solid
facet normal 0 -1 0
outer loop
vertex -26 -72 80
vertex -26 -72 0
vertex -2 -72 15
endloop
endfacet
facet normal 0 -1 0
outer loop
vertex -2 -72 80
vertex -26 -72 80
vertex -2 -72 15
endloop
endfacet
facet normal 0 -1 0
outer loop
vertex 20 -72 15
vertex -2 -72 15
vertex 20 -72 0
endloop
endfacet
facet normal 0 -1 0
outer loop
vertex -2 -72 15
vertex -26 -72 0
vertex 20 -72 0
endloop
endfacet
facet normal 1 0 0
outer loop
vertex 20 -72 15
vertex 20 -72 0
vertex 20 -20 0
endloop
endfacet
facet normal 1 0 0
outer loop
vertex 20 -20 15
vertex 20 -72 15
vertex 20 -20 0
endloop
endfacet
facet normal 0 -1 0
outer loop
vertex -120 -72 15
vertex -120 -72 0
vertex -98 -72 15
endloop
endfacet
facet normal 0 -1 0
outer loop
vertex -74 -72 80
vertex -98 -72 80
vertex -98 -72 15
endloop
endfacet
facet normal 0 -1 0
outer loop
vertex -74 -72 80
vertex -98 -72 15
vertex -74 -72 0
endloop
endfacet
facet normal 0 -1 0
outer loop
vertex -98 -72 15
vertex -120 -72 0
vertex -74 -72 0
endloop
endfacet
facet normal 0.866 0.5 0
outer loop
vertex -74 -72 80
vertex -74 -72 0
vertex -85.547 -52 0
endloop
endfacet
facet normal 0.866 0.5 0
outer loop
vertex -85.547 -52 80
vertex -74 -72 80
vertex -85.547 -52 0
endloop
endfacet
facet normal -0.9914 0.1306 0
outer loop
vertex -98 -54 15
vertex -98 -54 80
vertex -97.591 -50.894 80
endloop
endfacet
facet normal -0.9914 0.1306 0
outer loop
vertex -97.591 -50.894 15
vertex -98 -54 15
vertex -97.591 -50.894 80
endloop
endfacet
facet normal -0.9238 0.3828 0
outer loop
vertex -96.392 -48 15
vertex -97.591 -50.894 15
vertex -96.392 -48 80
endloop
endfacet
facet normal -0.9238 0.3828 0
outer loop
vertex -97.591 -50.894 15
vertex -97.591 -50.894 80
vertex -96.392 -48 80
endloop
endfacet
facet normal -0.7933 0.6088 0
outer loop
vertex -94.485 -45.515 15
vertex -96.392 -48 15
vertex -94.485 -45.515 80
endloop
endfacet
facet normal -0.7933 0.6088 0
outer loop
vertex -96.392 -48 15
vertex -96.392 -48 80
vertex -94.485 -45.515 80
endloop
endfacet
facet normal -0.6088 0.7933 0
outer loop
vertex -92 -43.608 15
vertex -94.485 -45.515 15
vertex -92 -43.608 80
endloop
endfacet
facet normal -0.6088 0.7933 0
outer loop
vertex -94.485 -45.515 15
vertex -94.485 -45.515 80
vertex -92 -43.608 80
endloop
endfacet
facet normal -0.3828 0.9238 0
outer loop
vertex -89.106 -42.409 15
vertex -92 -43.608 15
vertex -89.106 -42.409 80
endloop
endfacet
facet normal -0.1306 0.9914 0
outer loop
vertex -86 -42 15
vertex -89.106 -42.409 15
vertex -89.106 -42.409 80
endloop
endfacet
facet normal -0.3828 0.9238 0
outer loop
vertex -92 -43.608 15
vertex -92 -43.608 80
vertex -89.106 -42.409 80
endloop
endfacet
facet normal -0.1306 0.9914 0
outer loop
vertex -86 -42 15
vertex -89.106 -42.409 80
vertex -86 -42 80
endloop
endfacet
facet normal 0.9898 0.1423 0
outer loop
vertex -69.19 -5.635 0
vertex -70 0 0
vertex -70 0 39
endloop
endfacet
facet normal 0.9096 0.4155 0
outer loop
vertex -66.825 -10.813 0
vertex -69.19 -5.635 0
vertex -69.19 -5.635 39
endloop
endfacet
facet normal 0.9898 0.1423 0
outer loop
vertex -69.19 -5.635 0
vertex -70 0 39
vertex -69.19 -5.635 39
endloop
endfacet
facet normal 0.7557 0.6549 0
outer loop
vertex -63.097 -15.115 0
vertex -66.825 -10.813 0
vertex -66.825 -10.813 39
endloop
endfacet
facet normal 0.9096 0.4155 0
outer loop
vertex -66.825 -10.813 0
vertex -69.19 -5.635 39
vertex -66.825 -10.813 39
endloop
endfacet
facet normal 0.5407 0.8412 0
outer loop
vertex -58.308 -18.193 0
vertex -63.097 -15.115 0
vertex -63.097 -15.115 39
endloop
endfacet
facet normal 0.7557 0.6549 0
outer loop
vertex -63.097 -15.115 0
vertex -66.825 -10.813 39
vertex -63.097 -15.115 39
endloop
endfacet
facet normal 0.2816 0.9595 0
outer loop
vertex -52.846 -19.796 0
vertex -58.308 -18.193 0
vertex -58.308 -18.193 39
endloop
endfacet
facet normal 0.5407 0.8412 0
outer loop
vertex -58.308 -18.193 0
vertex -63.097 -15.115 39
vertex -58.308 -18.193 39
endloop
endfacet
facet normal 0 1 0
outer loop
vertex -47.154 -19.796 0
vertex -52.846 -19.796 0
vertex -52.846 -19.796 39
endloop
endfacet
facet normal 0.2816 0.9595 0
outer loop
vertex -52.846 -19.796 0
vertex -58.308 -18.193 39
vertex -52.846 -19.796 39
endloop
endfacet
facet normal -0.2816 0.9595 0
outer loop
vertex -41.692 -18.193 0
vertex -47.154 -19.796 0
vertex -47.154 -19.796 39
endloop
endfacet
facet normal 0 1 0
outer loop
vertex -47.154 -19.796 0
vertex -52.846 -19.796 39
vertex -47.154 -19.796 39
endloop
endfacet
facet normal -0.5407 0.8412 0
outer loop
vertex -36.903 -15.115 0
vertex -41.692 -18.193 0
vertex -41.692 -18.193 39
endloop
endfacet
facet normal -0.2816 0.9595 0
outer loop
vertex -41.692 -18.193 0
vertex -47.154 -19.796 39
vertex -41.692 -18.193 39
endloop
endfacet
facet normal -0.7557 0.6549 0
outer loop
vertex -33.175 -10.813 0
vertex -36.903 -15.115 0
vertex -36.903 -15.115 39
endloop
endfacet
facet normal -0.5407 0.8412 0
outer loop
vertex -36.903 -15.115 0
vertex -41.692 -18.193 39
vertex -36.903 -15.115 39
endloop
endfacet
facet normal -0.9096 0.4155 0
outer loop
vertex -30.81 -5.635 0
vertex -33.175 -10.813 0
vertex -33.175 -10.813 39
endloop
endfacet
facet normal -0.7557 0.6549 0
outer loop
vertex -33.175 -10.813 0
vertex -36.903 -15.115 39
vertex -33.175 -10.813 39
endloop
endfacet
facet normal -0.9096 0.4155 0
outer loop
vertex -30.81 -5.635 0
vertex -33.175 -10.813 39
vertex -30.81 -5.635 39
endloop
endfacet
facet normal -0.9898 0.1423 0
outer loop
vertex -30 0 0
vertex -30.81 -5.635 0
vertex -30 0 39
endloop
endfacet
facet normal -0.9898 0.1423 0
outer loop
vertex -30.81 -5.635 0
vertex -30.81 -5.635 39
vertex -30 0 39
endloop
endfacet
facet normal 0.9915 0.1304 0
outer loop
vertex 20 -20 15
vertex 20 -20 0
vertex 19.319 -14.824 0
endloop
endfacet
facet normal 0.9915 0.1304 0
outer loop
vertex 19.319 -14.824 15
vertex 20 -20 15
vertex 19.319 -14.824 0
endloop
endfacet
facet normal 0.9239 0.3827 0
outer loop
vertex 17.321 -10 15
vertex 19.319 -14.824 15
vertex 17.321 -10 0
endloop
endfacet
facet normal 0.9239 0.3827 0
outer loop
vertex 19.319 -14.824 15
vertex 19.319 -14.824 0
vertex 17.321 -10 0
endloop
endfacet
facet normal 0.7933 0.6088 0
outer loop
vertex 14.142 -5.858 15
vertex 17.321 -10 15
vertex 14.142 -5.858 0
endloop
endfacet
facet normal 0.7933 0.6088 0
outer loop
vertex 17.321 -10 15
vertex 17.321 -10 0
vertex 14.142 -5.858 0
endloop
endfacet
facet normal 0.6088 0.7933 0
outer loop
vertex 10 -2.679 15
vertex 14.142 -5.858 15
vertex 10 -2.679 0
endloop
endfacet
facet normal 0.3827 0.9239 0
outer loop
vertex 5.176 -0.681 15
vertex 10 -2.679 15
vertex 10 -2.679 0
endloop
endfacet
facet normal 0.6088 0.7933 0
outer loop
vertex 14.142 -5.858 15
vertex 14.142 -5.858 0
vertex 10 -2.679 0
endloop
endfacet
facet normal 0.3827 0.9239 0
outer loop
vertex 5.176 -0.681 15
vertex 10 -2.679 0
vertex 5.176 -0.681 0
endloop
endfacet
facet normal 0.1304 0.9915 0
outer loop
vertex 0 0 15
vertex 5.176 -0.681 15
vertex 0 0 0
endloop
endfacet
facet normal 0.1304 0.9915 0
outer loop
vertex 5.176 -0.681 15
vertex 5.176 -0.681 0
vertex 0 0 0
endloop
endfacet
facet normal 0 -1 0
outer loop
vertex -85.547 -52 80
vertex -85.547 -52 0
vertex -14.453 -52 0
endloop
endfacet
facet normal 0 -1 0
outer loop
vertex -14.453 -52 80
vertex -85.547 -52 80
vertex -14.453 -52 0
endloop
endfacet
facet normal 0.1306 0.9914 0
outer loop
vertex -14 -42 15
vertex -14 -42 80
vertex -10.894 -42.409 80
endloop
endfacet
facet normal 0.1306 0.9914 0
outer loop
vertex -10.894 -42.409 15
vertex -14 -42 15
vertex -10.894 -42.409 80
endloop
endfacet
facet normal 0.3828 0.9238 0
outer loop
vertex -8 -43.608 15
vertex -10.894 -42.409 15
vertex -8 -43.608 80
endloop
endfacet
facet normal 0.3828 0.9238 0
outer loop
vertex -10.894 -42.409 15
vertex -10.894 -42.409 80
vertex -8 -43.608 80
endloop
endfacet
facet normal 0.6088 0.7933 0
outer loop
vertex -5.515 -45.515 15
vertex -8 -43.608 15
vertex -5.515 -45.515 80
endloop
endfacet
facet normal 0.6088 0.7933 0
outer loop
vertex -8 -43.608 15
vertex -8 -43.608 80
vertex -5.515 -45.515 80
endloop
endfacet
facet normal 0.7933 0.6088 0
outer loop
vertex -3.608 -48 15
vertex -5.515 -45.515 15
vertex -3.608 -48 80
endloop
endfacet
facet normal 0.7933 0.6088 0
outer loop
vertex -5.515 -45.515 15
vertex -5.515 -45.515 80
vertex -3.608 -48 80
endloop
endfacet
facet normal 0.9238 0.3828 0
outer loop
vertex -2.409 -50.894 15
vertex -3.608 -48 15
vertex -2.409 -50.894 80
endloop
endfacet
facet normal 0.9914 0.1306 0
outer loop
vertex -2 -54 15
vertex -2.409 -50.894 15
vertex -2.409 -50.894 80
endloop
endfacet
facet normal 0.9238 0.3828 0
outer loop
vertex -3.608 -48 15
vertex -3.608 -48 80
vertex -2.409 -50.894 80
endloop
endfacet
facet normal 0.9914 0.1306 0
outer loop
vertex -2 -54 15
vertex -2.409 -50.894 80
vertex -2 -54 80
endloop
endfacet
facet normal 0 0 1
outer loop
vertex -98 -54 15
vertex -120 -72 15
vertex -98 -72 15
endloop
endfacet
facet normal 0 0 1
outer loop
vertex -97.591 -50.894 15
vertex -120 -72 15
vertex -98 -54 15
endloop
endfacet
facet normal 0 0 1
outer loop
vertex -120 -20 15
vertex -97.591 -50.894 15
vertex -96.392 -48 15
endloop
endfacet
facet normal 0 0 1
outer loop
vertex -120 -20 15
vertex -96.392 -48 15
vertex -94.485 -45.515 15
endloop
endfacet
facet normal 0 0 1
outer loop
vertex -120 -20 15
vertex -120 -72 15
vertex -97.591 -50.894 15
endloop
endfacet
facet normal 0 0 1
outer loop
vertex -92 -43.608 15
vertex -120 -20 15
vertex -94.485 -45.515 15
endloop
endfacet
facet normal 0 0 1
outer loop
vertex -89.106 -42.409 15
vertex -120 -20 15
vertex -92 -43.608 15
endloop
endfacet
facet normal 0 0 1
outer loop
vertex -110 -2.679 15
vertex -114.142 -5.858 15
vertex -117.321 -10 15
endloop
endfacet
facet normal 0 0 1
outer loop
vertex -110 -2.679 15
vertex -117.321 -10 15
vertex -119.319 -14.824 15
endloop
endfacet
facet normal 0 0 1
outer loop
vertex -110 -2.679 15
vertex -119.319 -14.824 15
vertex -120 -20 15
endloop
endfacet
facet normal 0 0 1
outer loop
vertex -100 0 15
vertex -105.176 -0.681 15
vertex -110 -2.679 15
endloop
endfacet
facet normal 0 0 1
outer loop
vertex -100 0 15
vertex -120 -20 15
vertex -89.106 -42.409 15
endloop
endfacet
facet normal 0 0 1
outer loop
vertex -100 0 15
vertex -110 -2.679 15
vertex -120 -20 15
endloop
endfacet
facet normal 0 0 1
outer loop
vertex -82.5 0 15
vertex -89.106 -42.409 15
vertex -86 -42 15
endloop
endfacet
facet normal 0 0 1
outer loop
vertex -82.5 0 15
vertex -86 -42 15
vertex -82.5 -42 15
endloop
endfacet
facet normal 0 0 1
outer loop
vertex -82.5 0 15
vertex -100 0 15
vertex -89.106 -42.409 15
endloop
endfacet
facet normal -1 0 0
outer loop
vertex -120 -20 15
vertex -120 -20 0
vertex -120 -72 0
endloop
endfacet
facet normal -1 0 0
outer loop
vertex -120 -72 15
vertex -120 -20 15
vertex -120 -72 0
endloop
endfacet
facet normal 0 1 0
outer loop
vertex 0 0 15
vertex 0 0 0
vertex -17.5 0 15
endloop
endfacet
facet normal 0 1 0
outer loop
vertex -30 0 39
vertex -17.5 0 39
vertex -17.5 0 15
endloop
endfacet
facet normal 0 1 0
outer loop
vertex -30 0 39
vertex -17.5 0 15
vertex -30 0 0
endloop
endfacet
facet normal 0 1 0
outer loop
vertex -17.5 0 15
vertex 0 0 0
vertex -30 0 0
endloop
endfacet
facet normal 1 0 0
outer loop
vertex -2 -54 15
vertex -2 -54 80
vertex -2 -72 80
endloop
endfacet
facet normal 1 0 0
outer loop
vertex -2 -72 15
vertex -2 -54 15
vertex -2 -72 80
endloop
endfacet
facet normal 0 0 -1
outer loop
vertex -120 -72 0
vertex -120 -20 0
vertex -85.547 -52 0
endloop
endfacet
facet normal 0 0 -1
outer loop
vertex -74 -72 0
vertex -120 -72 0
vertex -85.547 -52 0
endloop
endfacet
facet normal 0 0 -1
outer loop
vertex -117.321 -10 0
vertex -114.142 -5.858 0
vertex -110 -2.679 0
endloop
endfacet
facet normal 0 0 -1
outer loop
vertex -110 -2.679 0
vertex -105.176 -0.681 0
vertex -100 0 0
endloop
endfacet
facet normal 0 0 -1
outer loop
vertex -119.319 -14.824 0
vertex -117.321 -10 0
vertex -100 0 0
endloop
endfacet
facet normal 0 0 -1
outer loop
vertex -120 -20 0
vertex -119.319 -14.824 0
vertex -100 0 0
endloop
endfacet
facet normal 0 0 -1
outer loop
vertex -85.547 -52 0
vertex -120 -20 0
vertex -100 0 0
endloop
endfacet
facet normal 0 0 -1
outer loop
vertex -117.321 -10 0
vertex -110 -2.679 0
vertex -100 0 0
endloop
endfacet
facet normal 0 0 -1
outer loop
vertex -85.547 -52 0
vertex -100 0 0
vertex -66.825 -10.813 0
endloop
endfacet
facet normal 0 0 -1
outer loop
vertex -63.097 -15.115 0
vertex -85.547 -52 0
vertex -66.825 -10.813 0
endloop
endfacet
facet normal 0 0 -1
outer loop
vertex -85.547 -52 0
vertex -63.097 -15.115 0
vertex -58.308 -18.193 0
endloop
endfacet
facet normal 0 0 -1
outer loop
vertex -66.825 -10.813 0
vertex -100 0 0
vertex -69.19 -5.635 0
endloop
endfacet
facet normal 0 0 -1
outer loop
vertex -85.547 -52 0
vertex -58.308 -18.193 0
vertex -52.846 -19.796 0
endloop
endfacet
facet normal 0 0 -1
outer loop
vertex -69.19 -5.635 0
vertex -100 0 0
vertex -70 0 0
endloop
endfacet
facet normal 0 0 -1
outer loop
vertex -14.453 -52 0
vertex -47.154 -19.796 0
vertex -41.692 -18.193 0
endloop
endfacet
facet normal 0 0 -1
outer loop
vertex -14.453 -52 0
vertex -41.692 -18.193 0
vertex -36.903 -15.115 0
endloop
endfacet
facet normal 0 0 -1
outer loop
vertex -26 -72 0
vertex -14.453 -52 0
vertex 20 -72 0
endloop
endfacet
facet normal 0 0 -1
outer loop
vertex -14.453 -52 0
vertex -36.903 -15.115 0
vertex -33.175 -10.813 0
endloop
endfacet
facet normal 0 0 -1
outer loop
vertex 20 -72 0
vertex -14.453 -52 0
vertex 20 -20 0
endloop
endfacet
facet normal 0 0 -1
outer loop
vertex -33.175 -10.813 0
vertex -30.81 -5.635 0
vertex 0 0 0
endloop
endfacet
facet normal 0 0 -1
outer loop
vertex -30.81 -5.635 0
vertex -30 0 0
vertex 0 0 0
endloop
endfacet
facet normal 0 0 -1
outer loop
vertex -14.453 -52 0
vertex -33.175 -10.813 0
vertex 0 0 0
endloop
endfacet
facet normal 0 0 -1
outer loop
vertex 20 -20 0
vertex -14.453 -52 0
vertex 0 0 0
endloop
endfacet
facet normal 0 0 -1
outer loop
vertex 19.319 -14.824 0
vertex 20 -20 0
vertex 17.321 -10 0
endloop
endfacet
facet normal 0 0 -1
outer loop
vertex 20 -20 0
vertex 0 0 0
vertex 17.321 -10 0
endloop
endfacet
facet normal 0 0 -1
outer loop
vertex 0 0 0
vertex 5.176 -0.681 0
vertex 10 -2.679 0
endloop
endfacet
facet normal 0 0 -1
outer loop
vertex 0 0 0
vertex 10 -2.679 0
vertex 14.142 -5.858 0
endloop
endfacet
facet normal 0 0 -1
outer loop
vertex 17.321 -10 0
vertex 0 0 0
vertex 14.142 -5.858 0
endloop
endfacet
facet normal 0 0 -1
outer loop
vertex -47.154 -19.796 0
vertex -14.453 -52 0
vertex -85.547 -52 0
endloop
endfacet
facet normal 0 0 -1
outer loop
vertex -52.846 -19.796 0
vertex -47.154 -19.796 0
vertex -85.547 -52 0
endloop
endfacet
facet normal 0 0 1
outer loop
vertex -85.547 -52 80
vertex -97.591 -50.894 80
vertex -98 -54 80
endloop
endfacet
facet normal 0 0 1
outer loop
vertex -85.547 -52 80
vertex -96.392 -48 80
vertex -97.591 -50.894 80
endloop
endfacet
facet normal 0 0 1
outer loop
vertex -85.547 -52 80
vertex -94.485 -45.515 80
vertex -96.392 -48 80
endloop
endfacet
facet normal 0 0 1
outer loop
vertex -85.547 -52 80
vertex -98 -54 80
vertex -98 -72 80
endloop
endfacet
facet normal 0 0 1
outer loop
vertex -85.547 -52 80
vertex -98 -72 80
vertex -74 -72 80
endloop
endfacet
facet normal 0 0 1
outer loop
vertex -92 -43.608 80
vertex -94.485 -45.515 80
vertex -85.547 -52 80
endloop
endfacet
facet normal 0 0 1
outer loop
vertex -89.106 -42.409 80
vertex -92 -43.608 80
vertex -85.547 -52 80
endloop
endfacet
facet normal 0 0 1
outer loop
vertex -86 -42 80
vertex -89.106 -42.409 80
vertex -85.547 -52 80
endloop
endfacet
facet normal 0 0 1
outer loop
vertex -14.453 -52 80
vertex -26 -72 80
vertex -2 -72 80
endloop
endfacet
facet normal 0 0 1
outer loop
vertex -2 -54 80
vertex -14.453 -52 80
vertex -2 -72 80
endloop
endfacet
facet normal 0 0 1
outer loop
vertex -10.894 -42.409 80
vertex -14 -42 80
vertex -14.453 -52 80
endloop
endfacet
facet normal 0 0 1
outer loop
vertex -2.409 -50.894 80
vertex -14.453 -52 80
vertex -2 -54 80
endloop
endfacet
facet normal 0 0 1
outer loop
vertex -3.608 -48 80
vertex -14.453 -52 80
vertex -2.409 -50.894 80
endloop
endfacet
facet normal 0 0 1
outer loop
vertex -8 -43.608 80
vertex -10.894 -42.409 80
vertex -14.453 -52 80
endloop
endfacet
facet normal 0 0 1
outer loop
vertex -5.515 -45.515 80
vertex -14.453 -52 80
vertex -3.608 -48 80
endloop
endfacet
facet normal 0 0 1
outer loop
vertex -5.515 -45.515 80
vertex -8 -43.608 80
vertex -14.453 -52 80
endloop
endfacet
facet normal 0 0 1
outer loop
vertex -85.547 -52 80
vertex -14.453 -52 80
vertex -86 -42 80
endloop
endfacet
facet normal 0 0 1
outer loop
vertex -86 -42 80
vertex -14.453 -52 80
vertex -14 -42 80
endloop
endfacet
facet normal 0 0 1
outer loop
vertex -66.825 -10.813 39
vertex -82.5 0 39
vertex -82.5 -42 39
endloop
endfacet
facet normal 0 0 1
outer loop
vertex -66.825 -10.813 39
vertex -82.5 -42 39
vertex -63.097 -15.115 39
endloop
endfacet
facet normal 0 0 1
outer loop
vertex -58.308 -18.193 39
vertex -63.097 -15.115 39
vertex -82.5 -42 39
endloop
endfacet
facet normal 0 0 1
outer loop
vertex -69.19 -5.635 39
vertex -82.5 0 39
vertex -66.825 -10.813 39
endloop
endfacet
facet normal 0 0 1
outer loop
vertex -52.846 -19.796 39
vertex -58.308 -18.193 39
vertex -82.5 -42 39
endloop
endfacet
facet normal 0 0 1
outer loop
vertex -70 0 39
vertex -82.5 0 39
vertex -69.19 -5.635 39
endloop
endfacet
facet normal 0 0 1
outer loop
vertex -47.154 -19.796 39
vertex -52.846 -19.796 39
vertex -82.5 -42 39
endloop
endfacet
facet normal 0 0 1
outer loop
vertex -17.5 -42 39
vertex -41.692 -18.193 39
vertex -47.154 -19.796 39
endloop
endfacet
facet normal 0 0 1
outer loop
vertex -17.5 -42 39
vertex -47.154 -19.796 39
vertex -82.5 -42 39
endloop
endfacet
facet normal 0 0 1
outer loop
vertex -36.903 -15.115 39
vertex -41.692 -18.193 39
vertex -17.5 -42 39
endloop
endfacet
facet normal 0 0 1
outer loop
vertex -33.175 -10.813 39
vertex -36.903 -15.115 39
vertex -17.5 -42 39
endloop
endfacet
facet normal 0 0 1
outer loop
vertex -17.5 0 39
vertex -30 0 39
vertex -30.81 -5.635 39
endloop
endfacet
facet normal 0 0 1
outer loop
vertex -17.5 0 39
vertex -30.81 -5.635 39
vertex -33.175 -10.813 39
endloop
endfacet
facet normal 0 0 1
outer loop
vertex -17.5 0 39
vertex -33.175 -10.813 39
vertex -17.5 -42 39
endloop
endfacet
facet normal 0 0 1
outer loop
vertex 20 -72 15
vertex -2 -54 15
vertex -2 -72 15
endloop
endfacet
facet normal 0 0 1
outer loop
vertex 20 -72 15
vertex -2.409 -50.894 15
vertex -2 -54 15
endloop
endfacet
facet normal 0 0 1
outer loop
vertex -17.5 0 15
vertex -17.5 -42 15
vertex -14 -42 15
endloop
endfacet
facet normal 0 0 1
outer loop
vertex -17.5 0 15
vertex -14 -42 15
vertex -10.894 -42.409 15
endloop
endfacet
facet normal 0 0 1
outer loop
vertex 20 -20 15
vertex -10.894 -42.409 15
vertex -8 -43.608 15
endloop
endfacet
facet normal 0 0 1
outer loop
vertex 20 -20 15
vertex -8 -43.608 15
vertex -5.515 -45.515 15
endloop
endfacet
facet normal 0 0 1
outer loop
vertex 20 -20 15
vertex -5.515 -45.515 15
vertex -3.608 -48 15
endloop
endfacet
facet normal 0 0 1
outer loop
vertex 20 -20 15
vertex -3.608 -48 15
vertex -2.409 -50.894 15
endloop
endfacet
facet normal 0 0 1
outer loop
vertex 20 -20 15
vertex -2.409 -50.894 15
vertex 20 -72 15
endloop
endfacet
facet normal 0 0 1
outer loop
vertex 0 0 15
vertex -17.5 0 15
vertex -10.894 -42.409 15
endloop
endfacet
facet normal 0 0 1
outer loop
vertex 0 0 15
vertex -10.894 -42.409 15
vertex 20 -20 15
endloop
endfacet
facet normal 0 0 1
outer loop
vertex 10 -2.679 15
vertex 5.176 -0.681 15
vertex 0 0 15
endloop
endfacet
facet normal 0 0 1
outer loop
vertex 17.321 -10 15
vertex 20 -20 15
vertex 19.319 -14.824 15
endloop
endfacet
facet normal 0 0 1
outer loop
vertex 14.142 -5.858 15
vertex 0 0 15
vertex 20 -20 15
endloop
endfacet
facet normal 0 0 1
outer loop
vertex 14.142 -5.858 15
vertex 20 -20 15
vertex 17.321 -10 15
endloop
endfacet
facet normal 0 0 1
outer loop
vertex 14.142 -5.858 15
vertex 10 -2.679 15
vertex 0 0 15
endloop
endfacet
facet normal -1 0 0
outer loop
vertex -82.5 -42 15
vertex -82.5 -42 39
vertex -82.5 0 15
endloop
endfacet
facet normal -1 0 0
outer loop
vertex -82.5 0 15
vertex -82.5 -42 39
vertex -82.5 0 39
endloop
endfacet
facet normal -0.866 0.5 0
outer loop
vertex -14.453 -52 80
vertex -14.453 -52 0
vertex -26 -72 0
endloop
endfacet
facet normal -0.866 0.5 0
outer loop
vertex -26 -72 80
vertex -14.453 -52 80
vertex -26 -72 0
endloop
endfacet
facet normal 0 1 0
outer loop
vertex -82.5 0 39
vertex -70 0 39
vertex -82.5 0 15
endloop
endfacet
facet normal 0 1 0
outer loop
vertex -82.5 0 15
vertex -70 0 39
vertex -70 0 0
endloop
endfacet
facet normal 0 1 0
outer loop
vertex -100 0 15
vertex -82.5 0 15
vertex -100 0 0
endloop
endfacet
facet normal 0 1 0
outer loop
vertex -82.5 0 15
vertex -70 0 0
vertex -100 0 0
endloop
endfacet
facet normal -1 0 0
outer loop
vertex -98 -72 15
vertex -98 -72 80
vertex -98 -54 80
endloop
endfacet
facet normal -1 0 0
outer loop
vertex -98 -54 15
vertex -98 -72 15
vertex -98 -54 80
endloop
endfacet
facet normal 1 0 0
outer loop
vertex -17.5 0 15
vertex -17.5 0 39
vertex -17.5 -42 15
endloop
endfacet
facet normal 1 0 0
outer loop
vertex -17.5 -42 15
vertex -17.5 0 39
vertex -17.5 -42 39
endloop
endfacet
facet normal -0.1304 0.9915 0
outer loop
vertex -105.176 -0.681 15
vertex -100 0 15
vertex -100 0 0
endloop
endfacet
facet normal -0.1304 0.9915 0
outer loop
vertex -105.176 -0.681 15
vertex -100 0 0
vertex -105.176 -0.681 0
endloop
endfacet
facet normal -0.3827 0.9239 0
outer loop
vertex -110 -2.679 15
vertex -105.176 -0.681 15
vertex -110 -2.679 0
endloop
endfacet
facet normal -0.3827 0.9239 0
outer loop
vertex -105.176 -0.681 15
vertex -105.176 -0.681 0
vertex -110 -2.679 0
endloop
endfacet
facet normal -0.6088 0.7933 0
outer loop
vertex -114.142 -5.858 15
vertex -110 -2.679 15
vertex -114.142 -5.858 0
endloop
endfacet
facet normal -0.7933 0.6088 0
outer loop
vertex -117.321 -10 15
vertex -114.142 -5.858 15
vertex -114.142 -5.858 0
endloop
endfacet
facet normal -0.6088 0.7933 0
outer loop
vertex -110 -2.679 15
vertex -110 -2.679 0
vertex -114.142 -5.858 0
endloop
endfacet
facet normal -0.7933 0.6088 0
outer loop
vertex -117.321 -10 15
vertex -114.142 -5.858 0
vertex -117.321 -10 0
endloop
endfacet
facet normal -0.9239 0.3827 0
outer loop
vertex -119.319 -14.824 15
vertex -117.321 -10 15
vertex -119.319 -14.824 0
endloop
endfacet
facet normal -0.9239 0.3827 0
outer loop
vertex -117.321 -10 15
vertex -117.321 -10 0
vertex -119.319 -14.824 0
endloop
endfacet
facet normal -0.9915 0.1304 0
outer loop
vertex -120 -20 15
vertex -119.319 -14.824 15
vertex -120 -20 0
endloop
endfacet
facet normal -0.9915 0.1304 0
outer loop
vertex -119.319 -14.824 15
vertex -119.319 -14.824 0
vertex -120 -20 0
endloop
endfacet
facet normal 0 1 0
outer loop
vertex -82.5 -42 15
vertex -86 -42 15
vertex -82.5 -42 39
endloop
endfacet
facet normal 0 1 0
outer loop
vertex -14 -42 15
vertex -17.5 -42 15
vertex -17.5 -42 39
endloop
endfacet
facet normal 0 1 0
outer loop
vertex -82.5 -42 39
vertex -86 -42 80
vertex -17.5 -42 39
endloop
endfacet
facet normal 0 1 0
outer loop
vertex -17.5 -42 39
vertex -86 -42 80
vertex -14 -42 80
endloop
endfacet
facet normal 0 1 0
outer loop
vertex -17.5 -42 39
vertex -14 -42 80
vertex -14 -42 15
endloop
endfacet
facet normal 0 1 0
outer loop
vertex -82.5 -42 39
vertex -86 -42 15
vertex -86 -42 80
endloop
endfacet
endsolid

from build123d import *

# Parameters (mm, degrees)
IZIM1_W                     = 65
IZIM1_H                     = 42
Y_KSEKLIK_EKSTR_ZYON1_DEPTH = 80
IZIM3_R                     = 20
KES_EKSTR_ZYON1_DEPTH       = 81
KES_EKSTR_ZYON2_DEPTH       = 41
KES_EKSTR_ZYON5_DEPTH       = 65
KES_EKSTR_ZYON6_DEPTH       = 156
KES_EKSTR_ZYON6_DEPTH_BACK  = 1


with BuildPart() as part:
    # Çizim1 → Yükseklik-Ekstrüzyon1 (new body)
    with BuildSketch(Plane.XY):
        with BuildLine():
            Line((-120, -72), (-100, -72))
            Line((-100, -72), (0, -72))
            Line((0, -72), (20, -72))
            Line((20, -72), (20, -20))
            ThreePointArc((20, -20), (14.142135624, -5.857864376), (0, 0))
            Line((0, 0), (-17.5, 0))
            Line((-17.5, 0), (-17.5, -42))
            Line((-17.5, -42), (-82.5, -42))
            Line((-82.5, -42), (-82.5, 0))
            Line((-82.5, 0), (-100, 0))
            ThreePointArc((-100, 0), (-114.142135624, -5.857864376), (-120, -20))
            Line((-120, -20), (-120, -72))
        make_face()
        with Locations((-50, -21)):
            Rectangle(IZIM1_W, IZIM1_H)
    extrude(amount=Y_KSEKLIK_EKSTR_ZYON1_DEPTH)

    # Çizim3 → Kes-Ekstrüzyon1 (cut, through all)
    with BuildSketch(Plane.XY.offset(80)):
        with Locations((-50, 0)):
            Circle(IZIM3_R)
    extrude(amount=-KES_EKSTR_ZYON1_DEPTH, mode=Mode.SUBTRACT)

    # Çizim4 → Kes-Ekstrüzyon2 (cut)
    with BuildSketch(Plane.XY.offset(80)):
        with BuildLine():
            ThreePointArc((-30, 0), (-50, -20), (-70, 0))
            Line((-70, 0), (-82.5, 0))
            Line((-82.5, 0), (-82.5, -42))
            Line((-82.5, -42), (-17.5, -42))
            Line((-17.5, -42), (-17.5, 0))
            Line((-17.5, 0), (-30, 0))
        make_face()
    extrude(amount=-KES_EKSTR_ZYON2_DEPTH, mode=Mode.SUBTRACT)

    # Çizim5 → Kes-Ekstrüzyon5 (cut)
    with BuildSketch(Plane.XY.offset(80)):
        with BuildLine():
            Line((-120, -20), (-120, -72))
            Line((-120, -72), (-98, -72))
            Line((-98, -72), (-98, -54))
            ThreePointArc((-98, -54), (-94.485281374, -45.514718626), (-86, -42))
            Line((-86, -42), (-82.5, -42))
            Line((-82.5, -42), (-82.5, 0))
            Line((-82.5, 0), (-100, 0))
            ThreePointArc((-100, 0), (-114.142135624, -5.857864376), (-120, -20))
        make_face()
        with BuildLine():
            Line((-2, -54), (-2, -72))
            Line((-2, -72), (20, -72))
            Line((20, -72), (20, -20))
            ThreePointArc((20, -20), (14.142135624, -5.857864376), (0, 0))
            Line((0, 0), (-17.5, 0))
            Line((-17.5, 0), (-17.5, -42))
            Line((-17.5, -42), (-14, -42))
            ThreePointArc((-14, -42), (-5.514718626, -45.514718626), (-2, -54))
        make_face()
        Polygon((-85.547005384, -52), (-74, -72), (-26, -72), (-14.452994616, -52), align=None)
    extrude(amount=-KES_EKSTR_ZYON5_DEPTH, mode=Mode.SUBTRACT)

    # Çizim16 → Kes-Ekstrüzyon6 (cut, two sides)
    with BuildSketch(Plane.XY) as kes_ekstr_zyon6_sk:
        Polygon((-74, -72), (-85.547005384, -52), (-14.452994616, -52), (-26, -72), align=None)
    extrude(amount=KES_EKSTR_ZYON6_DEPTH, mode=Mode.SUBTRACT)
    extrude(kes_ekstr_zyon6_sk.sketch, amount=-KES_EKSTR_ZYON6_DEPTH_BACK, mode=Mode.SUBTRACT)


solid = part.part
